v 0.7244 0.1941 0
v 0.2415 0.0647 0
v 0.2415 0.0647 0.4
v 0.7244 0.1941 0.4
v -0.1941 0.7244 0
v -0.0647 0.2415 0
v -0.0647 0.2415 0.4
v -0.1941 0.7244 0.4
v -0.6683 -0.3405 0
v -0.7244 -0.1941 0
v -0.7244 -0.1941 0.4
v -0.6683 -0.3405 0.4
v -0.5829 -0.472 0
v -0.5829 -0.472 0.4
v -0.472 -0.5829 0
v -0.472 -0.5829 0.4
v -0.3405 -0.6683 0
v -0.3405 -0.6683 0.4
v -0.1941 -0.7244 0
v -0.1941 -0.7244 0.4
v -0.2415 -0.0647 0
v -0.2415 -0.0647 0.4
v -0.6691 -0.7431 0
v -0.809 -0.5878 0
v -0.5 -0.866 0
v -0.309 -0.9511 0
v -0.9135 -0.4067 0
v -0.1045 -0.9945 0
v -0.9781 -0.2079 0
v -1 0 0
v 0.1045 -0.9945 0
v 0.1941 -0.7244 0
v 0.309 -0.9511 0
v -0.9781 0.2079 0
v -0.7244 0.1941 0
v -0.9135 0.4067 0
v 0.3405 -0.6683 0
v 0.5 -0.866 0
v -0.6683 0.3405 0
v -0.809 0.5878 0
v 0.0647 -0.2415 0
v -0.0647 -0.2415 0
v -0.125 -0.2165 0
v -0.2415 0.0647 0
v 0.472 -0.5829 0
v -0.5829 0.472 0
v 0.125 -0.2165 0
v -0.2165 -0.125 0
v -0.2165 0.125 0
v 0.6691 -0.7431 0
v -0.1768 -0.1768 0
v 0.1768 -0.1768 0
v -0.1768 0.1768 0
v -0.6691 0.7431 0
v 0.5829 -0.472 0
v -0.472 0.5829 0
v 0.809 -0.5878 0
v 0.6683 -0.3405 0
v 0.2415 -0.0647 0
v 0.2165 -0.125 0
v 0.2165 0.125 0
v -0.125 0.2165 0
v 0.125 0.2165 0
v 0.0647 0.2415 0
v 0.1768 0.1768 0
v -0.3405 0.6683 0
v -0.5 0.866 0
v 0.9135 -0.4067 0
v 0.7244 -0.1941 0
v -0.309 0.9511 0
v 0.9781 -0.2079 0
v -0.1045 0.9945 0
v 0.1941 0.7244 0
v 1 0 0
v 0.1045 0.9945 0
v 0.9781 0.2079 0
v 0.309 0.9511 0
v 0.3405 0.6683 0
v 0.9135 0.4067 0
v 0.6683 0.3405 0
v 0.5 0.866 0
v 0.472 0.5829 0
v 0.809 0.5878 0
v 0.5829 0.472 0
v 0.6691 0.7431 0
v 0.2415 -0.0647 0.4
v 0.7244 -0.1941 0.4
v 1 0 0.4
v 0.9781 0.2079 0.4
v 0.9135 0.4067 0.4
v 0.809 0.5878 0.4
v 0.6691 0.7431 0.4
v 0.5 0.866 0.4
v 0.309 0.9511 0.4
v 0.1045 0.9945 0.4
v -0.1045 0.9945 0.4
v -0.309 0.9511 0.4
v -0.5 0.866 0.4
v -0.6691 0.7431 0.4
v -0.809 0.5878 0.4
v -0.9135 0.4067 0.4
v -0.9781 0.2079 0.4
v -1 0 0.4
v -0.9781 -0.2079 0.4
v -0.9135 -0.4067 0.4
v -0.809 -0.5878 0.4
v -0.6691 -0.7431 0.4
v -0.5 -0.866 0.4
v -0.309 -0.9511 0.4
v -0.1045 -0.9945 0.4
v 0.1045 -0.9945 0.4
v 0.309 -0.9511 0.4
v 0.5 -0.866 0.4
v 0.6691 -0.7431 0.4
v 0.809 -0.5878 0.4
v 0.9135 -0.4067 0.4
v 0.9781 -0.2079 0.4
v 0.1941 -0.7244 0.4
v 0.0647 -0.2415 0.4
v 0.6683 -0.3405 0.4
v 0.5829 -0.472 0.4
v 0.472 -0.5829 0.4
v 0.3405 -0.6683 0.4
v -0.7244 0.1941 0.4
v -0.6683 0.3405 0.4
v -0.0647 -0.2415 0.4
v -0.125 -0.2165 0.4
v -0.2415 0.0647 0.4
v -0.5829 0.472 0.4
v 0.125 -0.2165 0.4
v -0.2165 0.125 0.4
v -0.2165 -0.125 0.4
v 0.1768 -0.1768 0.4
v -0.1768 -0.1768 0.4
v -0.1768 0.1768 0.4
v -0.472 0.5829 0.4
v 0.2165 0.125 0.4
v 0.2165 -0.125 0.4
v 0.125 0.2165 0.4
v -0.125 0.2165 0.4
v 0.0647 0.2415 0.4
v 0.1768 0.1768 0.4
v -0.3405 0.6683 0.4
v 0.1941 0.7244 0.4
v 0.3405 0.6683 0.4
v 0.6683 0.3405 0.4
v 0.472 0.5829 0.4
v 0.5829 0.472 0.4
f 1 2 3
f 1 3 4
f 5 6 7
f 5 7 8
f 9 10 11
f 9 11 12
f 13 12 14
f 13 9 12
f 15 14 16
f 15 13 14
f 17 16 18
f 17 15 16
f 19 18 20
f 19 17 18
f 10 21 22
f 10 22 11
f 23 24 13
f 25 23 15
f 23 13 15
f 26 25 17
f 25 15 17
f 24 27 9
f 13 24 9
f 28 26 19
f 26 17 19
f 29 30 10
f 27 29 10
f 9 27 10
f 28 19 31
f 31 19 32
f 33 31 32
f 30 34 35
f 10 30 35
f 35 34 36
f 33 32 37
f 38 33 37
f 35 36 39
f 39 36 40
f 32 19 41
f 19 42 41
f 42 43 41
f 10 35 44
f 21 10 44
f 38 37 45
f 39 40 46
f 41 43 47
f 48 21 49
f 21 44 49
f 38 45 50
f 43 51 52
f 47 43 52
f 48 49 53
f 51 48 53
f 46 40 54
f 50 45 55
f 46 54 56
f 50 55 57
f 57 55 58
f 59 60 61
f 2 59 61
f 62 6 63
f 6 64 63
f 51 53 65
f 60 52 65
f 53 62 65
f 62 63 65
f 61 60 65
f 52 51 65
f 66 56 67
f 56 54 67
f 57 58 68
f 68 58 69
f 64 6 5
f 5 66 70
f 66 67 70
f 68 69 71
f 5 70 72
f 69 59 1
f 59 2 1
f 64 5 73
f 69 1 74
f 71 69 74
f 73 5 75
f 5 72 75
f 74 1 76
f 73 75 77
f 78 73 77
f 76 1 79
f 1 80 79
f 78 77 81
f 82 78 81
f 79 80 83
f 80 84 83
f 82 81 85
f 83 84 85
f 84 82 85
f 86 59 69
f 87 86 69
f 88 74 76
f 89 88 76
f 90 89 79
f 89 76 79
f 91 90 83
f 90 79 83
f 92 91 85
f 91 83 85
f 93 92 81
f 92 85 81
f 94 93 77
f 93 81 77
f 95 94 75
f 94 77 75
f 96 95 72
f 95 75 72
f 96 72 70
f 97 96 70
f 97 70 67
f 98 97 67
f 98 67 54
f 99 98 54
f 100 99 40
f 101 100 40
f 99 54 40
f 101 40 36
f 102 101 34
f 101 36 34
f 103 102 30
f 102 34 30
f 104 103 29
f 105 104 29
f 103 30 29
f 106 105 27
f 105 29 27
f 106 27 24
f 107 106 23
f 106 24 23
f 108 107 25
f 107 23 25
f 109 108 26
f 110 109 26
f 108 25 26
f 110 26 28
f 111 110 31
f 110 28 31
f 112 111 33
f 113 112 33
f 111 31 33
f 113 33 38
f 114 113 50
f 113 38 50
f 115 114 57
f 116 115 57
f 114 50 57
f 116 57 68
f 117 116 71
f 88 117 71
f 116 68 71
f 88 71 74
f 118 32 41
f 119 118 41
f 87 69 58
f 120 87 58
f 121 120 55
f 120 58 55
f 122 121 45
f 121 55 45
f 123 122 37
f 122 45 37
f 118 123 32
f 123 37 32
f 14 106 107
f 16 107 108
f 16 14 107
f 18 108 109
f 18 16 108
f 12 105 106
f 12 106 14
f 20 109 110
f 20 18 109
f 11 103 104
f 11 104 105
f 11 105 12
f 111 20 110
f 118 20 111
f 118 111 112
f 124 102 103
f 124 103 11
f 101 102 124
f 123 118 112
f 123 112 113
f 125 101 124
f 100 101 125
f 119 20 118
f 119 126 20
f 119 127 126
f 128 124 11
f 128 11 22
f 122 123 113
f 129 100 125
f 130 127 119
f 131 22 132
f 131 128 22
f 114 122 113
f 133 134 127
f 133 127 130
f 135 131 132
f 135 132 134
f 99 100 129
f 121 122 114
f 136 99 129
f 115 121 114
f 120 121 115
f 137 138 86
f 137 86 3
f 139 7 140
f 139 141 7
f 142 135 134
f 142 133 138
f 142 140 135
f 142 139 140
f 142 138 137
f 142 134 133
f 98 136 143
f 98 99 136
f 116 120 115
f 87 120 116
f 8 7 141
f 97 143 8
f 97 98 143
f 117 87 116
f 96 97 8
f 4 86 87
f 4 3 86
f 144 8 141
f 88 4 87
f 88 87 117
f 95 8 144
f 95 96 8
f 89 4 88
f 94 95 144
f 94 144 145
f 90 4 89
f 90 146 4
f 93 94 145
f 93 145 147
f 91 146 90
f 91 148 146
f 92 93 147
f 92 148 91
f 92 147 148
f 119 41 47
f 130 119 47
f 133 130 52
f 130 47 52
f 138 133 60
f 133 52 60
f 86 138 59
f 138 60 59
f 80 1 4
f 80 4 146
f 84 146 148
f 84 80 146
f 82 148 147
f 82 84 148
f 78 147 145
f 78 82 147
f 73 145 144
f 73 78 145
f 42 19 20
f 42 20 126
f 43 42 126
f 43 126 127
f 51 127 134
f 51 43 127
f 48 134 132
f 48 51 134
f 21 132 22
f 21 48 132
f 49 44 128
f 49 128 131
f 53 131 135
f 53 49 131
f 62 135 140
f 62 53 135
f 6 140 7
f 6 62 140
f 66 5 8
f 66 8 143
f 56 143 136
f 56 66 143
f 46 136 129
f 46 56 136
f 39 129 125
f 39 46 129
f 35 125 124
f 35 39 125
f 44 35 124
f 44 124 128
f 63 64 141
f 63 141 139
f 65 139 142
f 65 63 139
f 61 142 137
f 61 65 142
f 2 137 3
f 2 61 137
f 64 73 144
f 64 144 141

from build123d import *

# Parameters (mm, degrees)
SKETCH1_R           = 1
BOSS_EXTRUDE1_DEPTH = 0.4


with BuildPart() as part:
    # Sketch1 → Boss-Extrude1 (new body)
    with BuildSketch(Plane.XY):
        Circle(SKETCH1_R)
        with BuildLine():
            Line((-0.72444437, 0.194114284), (-0.241481457, 0.064704761))
            ThreePointArc((-0.241481457, 0.064704761), (-0.176776695, 0.176776695), (-0.064704761, 0.241481457))
            Line((-0.064704761, 0.241481457), (-0.194114284, 0.72444437))
            ThreePointArc((-0.194114284, 0.72444437), (-0.530330086, 0.530330086), (-0.72444437, 0.194114284))
        make_face(mode=Mode.SUBTRACT)
        with BuildLine():
            Line((0.194114284, 0.72444437), (0.064704761, 0.241481457))
            ThreePointArc((0.064704761, 0.241481457), (0.176776695, 0.176776695), (0.241481457, 0.064704761))
            Line((0.241481457, 0.064704761), (0.72444437, 0.194114284))
            ThreePointArc((0.72444437, 0.194114284), (0.530330086, 0.530330086), (0.194114284, 0.72444437))
        make_face(mode=Mode.SUBTRACT)
        with BuildLine():
            Line((0.194114284, -0.72444437), (0.064704761, -0.241481457))
            ThreePointArc((0.064704761, -0.241481457), (0.176776695, -0.176776695), (0.241481457, -0.064704761))
            Line((0.241481457, -0.064704761), (0.72444437, -0.194114284))
            ThreePointArc((0.72444437, -0.194114284), (0.530330086, -0.530330086), (0.194114284, -0.72444437))
        make_face(mode=Mode.SUBTRACT)
        with BuildLine():
            Line((-0.194114284, -0.72444437), (-0.064704761, -0.241481457))
            ThreePointArc((-0.064704761, -0.241481457), (-0.176776695, -0.176776695), (-0.241481457, -0.064704761))
            Line((-0.241481457, -0.064704761), (-0.72444437, -0.194114284))
            ThreePointArc((-0.72444437, -0.194114284), (-0.530330086, -0.530330086), (-0.194114284, -0.72444437))
        make_face(mode=Mode.SUBTRACT)
    extrude(amount=BOSS_EXTRUDE1_DEPTH)


solid = part.part
